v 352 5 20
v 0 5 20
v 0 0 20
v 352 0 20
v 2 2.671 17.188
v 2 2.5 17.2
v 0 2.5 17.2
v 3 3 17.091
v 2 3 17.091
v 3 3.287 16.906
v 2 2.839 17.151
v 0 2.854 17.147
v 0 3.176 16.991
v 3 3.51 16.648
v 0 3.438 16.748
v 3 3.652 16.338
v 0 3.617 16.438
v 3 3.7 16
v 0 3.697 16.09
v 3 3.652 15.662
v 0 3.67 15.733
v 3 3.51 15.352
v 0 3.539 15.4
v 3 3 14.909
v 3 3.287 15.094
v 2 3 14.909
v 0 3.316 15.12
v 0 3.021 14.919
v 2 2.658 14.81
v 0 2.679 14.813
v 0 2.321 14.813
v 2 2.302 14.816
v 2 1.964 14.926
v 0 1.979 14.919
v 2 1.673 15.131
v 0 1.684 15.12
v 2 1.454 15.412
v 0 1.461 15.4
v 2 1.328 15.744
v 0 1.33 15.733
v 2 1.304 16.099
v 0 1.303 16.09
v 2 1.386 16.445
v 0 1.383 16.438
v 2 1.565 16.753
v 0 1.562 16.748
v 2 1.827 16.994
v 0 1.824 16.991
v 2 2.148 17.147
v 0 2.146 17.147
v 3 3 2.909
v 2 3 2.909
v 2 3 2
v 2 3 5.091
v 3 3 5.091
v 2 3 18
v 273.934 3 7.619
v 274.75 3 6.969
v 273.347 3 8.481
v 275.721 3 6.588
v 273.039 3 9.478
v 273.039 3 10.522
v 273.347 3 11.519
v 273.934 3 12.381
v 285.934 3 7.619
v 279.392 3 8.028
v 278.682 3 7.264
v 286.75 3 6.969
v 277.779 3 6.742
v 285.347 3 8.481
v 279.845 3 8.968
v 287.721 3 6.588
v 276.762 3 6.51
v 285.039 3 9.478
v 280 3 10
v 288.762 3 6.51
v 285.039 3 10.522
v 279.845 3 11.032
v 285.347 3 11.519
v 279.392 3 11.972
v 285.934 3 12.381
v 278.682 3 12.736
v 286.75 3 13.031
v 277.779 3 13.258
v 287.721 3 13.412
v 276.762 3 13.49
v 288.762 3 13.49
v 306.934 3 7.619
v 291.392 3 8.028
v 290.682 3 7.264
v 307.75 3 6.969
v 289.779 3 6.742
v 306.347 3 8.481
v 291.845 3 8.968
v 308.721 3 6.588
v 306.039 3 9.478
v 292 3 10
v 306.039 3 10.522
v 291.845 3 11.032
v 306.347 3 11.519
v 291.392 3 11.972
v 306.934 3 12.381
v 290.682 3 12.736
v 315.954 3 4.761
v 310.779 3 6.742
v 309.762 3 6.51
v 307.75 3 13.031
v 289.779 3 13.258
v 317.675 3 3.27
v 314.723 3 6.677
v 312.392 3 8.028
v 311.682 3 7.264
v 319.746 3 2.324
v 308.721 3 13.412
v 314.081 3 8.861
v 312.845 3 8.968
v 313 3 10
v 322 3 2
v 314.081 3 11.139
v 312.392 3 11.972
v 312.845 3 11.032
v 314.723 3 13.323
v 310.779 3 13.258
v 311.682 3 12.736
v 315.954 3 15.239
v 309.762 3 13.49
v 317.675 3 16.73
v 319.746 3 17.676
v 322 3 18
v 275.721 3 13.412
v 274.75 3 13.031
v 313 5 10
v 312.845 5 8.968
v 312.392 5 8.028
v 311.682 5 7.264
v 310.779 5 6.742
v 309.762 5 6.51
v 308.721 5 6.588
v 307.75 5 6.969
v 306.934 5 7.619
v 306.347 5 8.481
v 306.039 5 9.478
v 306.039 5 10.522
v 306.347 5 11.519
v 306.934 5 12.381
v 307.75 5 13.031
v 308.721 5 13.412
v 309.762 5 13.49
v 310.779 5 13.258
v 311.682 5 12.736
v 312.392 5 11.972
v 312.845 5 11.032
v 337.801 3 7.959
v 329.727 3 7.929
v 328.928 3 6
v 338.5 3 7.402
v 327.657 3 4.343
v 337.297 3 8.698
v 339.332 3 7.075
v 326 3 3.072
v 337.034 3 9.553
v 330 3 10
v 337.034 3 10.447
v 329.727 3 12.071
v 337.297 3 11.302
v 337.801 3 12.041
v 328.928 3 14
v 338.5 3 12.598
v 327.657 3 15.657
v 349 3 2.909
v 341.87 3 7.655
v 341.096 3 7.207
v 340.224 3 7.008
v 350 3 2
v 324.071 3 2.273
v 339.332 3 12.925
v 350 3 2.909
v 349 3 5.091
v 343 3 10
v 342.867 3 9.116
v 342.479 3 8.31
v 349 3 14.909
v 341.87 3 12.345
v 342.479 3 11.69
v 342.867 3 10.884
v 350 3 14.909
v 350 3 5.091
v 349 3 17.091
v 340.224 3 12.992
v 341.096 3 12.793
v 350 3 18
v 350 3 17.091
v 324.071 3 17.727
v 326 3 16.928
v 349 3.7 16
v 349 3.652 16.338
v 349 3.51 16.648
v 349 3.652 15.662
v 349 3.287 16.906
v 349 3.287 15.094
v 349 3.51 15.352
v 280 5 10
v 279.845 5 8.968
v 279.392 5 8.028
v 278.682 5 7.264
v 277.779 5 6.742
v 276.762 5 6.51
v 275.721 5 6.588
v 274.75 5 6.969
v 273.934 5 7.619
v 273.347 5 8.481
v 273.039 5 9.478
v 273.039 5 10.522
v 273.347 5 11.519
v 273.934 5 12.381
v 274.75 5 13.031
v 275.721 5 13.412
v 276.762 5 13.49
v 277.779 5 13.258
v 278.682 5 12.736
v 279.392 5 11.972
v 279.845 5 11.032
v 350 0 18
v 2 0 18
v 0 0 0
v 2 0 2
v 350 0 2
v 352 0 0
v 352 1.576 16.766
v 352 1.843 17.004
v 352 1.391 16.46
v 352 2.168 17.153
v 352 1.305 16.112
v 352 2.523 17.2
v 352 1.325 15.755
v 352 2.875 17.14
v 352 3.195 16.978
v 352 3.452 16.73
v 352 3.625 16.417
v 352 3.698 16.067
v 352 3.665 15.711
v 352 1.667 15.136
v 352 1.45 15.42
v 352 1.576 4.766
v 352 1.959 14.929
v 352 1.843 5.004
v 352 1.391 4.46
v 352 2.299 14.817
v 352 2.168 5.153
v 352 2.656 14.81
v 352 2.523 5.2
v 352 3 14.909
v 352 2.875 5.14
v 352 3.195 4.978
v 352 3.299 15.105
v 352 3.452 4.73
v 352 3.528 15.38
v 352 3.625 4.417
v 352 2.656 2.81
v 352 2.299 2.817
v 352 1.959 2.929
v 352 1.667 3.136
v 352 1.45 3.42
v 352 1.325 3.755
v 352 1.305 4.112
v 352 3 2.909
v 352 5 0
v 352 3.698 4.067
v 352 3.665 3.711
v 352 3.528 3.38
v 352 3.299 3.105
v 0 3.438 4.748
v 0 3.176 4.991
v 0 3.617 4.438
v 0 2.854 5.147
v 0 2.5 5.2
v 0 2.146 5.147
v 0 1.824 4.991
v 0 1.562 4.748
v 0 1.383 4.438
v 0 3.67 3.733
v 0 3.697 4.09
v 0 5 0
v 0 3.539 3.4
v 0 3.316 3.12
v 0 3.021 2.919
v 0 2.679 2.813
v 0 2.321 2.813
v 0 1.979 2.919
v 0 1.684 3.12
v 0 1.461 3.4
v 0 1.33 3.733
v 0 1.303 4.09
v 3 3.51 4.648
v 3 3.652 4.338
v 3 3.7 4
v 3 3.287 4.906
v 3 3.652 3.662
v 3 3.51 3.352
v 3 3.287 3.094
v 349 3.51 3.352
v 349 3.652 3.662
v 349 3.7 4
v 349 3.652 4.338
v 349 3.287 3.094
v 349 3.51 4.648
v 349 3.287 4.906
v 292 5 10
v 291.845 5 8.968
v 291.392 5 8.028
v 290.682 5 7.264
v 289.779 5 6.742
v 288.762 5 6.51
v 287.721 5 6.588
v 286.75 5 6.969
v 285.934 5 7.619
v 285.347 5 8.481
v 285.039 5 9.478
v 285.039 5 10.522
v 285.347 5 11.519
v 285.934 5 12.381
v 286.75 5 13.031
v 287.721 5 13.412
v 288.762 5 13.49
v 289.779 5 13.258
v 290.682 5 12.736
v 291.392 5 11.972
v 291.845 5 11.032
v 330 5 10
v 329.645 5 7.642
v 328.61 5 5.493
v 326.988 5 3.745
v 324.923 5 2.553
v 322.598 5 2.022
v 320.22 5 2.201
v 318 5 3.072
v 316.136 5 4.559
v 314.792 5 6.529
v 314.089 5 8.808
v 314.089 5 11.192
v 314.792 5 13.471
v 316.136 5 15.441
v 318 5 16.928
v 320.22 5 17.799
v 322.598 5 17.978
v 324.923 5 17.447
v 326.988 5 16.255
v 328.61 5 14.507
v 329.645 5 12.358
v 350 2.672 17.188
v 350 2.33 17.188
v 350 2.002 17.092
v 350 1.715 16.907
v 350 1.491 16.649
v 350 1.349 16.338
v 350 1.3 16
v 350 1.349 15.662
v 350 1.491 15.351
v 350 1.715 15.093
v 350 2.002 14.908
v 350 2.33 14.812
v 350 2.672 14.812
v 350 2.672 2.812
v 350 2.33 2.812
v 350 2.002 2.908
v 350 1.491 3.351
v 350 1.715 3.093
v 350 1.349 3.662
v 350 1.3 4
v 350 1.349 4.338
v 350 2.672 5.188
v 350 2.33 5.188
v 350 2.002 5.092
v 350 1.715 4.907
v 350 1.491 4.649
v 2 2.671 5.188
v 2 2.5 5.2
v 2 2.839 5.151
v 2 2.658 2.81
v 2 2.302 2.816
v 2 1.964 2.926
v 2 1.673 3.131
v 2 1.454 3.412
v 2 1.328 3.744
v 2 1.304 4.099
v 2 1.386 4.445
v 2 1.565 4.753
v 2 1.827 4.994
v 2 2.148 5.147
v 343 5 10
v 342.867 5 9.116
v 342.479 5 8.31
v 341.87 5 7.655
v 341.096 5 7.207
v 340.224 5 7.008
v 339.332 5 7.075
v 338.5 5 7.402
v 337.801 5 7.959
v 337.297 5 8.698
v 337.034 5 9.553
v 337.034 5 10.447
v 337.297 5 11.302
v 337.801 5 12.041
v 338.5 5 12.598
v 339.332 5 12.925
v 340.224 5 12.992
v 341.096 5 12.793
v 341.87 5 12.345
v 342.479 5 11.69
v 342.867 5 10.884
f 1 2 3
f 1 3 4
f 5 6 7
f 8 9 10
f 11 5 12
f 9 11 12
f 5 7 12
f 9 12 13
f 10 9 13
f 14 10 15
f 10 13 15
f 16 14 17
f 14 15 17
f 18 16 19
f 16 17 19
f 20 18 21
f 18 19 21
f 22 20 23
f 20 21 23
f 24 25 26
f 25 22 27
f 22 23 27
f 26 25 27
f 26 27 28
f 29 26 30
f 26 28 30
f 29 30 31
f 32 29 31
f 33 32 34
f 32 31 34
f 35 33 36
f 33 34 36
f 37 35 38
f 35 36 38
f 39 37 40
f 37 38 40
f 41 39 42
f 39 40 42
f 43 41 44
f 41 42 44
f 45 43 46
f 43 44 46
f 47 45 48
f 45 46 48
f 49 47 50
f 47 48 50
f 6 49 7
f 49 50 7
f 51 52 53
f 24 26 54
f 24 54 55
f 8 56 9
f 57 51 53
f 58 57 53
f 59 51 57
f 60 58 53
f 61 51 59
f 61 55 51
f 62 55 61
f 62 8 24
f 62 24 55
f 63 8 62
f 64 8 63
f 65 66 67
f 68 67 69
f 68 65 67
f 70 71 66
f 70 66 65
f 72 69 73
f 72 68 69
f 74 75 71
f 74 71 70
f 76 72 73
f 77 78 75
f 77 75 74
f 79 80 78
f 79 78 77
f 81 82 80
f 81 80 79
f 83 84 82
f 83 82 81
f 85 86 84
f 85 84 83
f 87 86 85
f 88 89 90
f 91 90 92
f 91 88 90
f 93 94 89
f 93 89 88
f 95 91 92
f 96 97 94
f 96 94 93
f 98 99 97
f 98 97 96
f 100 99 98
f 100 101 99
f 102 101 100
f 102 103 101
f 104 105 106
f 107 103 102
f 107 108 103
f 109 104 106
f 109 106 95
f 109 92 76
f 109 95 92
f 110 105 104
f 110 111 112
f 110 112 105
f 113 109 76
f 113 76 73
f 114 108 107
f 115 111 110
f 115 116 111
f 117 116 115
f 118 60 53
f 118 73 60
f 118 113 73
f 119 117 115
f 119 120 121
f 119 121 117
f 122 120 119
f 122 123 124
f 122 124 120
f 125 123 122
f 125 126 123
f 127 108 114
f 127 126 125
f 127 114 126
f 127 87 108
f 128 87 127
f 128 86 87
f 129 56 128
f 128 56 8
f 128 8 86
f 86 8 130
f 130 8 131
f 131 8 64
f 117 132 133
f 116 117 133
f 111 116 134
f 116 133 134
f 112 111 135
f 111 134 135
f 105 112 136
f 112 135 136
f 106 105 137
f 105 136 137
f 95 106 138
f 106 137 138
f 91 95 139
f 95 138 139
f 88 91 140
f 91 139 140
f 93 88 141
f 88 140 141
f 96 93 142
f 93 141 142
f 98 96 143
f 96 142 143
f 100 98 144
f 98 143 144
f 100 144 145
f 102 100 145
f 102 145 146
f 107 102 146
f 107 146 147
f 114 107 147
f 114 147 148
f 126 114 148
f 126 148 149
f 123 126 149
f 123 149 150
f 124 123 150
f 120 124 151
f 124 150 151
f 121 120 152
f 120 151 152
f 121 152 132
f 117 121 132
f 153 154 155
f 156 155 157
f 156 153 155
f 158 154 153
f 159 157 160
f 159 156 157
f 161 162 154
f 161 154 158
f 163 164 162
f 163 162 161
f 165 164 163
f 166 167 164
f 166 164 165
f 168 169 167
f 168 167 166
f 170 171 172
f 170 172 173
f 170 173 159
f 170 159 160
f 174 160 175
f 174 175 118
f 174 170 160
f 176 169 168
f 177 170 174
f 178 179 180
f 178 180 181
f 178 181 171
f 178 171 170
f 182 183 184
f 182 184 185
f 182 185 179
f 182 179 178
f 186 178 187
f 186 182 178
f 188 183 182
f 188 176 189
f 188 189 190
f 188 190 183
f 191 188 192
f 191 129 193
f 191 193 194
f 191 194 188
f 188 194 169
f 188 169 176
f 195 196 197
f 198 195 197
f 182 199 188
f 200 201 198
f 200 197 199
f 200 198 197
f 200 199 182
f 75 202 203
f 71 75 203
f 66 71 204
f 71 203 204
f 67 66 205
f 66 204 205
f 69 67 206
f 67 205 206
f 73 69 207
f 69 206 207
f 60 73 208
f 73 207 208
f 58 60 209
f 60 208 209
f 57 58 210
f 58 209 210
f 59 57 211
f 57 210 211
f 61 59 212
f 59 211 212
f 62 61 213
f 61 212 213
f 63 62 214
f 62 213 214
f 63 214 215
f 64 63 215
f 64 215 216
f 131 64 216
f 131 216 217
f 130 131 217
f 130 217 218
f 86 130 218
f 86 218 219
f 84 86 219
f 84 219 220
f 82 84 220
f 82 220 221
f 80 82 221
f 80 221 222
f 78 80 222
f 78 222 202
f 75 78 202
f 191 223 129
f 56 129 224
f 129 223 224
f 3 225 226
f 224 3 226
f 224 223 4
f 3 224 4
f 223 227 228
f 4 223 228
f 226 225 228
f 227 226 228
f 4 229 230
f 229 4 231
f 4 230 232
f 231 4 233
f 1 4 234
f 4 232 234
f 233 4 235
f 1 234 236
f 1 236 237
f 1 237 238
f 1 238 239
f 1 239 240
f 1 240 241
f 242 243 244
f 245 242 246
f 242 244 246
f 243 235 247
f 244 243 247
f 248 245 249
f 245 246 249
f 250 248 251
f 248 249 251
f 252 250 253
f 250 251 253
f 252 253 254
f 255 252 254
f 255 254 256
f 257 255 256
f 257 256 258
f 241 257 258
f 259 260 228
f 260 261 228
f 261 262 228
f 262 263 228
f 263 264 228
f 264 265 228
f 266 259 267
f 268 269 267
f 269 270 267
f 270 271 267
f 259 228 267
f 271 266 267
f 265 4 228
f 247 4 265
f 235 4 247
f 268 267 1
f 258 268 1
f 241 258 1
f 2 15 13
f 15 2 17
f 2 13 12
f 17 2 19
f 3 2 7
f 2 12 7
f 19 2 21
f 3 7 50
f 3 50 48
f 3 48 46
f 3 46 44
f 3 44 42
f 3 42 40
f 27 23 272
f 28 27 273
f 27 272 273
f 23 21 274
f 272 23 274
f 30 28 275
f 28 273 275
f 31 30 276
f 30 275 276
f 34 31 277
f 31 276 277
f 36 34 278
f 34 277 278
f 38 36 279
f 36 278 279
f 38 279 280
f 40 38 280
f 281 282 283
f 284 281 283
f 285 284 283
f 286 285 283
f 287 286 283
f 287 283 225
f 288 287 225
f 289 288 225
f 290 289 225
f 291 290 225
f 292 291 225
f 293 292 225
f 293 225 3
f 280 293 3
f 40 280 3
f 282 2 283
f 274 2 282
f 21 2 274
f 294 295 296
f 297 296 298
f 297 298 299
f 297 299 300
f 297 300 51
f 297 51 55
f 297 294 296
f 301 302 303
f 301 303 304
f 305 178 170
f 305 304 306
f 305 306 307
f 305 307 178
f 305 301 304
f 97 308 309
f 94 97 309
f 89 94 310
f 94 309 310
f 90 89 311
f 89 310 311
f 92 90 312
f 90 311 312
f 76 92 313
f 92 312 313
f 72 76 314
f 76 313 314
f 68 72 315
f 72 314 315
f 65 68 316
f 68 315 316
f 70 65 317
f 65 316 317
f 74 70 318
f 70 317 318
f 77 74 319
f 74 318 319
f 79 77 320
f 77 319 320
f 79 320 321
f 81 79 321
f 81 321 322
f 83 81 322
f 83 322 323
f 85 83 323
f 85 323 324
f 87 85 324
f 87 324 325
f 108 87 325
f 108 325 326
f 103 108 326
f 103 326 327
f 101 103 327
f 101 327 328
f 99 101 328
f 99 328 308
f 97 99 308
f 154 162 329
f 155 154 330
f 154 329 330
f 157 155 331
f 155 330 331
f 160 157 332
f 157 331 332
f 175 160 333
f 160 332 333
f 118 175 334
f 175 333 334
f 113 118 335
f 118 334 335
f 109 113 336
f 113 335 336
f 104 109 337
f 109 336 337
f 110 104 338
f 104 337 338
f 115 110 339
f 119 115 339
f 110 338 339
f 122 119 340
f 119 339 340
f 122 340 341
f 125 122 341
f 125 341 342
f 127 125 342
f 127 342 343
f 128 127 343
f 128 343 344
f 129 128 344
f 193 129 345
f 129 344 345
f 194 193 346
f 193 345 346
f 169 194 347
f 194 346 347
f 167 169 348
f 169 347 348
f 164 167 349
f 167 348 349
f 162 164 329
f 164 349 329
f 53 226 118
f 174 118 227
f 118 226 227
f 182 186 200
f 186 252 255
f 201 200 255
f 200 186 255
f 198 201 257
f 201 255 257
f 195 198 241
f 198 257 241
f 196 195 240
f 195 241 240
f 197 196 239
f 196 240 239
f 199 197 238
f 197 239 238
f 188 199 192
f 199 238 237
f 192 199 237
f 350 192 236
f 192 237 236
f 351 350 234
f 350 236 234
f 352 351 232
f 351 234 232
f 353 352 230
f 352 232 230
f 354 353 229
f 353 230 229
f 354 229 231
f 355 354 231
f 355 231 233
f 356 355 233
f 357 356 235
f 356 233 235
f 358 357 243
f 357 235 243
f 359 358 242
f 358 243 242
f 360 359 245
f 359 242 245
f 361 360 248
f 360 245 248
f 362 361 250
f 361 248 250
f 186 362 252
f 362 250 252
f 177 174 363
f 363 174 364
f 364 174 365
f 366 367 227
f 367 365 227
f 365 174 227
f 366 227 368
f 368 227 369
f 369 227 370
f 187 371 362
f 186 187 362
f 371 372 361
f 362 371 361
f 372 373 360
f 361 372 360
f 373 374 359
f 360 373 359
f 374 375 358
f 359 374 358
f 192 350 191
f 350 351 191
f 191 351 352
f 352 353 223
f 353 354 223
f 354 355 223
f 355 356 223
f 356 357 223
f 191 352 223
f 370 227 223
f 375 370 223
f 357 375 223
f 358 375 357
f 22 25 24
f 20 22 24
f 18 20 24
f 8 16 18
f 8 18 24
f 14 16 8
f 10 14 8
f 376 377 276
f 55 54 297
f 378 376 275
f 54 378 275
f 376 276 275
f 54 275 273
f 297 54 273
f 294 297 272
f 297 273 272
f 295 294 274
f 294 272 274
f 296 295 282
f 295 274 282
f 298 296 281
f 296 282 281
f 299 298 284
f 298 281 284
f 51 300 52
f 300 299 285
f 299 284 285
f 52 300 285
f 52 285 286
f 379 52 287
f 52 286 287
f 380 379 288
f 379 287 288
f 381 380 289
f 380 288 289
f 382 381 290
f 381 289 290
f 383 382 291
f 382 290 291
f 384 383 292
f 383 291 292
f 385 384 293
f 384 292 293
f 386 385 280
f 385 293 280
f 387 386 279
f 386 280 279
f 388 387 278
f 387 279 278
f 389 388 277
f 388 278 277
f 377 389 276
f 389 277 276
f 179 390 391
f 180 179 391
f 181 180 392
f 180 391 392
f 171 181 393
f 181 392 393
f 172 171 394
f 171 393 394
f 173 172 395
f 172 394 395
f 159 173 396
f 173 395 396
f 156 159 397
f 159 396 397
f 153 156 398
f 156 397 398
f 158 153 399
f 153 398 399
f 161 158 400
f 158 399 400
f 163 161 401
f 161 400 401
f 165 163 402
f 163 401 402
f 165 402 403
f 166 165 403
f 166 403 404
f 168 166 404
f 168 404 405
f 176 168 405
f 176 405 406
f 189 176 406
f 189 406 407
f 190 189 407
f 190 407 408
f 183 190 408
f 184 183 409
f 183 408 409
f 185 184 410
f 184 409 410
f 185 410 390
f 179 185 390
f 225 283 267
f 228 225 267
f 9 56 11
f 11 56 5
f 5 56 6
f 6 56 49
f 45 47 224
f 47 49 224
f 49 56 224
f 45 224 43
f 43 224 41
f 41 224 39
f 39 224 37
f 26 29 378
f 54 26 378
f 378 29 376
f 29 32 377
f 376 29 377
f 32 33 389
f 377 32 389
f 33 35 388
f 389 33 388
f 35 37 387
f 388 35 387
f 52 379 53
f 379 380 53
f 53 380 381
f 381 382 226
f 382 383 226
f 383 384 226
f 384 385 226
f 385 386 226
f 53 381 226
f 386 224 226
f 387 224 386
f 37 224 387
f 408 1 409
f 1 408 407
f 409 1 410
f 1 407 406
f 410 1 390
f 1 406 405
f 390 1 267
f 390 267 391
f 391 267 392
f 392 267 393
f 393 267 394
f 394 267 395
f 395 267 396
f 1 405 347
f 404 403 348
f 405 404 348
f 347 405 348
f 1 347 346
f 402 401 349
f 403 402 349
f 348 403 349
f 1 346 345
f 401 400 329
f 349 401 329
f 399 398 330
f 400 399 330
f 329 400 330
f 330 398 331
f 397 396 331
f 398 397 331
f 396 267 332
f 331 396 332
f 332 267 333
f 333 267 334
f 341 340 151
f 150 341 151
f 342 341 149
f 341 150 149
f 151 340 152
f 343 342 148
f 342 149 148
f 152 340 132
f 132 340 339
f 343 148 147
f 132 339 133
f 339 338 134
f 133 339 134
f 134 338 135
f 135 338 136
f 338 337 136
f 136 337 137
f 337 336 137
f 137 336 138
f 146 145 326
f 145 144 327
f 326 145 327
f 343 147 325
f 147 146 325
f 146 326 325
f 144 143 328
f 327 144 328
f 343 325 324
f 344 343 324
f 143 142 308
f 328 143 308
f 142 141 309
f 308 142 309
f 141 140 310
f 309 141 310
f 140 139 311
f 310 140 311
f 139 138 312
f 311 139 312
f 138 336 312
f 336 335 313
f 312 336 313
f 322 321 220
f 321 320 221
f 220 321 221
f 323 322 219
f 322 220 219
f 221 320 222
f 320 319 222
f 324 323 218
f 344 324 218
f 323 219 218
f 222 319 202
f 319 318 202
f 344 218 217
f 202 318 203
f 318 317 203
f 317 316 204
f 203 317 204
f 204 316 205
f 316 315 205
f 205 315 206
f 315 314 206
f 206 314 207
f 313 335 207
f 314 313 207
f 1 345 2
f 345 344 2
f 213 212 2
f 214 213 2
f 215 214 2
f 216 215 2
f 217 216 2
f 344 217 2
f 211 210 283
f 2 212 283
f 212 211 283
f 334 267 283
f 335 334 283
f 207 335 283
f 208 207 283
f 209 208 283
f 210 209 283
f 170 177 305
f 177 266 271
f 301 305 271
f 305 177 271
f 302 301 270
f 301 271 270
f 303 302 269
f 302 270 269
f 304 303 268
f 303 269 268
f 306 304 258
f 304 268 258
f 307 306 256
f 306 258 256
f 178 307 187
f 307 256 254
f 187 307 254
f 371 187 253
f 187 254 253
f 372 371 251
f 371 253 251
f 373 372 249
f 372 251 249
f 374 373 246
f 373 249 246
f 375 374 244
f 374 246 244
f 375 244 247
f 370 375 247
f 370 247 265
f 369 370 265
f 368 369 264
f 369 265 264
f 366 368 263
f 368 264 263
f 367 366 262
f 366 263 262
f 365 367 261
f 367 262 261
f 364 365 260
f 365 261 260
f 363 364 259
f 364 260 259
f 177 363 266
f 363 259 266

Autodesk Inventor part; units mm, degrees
ref_plane "YZ Plane" through (0, 0, 0) normal (1, 0, 0) x (0, 1, 0)
ref_plane "XZ Plane" through (0, 0, 0) normal (0, 1, 0) x (-1, 0, 0)
ref_plane "XY Plane" through (0, 0, 0) normal (0, 0, 1) x (1, 0, 0)
sketch "スケッチ1" plane through (0, 0, 0) normal (0, 0, 1) x (1, 0, 0)
  line L0 (0, 0) -> (352, 0)
  line L1 (352, 0) -> (352, 5)
  line L2 (352, 5) -> (0, 5)
  line L3 (0, 5) -> (0, 0)
  line L4 (0, 0) -> (6, 0)
  line L5 (0, 1) -> (0, 0)
  dimension "d0" = 352
  dimension "d1" = 5
extrude "押し出し1" add sketch "スケッチ1" along normal blind 20
sketch "スケッチ3" plane through (0, 0, 0) normal (-1, 0, 0) x (0, 0, 1)
  line L0 (0, 5) -> (0, 0) projected
  line L1 (0, 0) -> (20, 0) projected
  line L2 (20, 5) -> (20, 0) projected
  line L3 (0, 5) -> (20, 5) projected
  circle A0 centre (4, 2.5) radius 1.2
  circle A1 centre (16, 2.5) radius 1.2
  dimension "d14" = 2.4
  dimension "d15" = 2.4
  dimension "d16" = 2.5
  dimension "d17" = 4
  dimension "d18" = 4
  dimension "d19" = 2.5
extrude "押し出し3" cut sketch "スケッチ3" against normal blind 3 contours A0 | A1
sketch "スケッチ4" plane through (0, 0, 0) normal (0, -1, 0) x (1, 0, 0)
  line L0 (0, 0) -> (352, 0) projected
  line L1 (352, 0) -> (352, 20) projected
  line L2 (0, 20) -> (352, 20) projected
  line L3 (0, 0) -> (0, 20) projected
  line L4 (2, 2) -> (350, 2)
  line L5 (350, 2) -> (350, 18)
  line L6 (350, 18) -> (2, 18)
  line L7 (2, 18) -> (2, 2)
  dimension "d22" = 2
  dimension "d23" = 2
  dimension "d24" = 2
  dimension "d25" = 2
extrude "押し出し4" cut sketch "スケッチ4" against normal blind 3 contours L7 L6 L5 L4
sketch "スケッチ5" plane through (0, 5, 0) normal (0, 1, 0) x (1, 0, 0)
  circle A0 centre (322, -10) radius 8 projected
extrude "押し出し5" cut sketch "スケッチ5" against normal through all
sketch "スケッチ6" plane through (0, 5, 0) normal (0, 1, 0) x (1, 0, 0)
  circle A0 centre (340, -10) radius 3 projected
extrude "押し出し6" cut sketch "スケッチ6" against normal through all
sketch "スケッチ7" plane through (0, 5, 0) normal (0, 1, 0) x (1, 0, 0)
  circle A0 centre (309.5, -10) radius 2 projected
  circle A1 centre (288.5, -10) radius 3.5 projected
  circle A2 centre (276.5, -10) radius 3.5 projected
  circle A3 centre (309.5, -10) radius 4.5 projected
  circle A4 centre (309.5, -10) radius 3.25 projected
  circle A5 centre (309.5, -10) radius 3.5 projected
extrude "押し出し7" cut sketch "スケッチ7" against normal through all contours A0 | A1 | A2 | A4 | A5
sketch "スケッチ8" plane through (352, 0, 0) normal (1, 0, 0) x (0, 0, -1)
  arc A0 (-17.0909, 3) -> (-14.9091, 3) centre (-16, 2.5) ccw projected
  arc A1 (-14.9091, 3) -> (-17.0909, 3) centre (-16, 2.5) ccw projected
  arc A2 (-2.9091, 3) -> (-5.0909, 3) centre (-4, 2.5) ccw projected
  arc A3 (-5.0909, 3) -> (-2.9091, 3) centre (-4, 2.5) ccw projected
extrude "押し出し8" cut sketch "スケッチ8" against normal blind 3
properties part number "arm1_L" material "アルミニウム 6061"
